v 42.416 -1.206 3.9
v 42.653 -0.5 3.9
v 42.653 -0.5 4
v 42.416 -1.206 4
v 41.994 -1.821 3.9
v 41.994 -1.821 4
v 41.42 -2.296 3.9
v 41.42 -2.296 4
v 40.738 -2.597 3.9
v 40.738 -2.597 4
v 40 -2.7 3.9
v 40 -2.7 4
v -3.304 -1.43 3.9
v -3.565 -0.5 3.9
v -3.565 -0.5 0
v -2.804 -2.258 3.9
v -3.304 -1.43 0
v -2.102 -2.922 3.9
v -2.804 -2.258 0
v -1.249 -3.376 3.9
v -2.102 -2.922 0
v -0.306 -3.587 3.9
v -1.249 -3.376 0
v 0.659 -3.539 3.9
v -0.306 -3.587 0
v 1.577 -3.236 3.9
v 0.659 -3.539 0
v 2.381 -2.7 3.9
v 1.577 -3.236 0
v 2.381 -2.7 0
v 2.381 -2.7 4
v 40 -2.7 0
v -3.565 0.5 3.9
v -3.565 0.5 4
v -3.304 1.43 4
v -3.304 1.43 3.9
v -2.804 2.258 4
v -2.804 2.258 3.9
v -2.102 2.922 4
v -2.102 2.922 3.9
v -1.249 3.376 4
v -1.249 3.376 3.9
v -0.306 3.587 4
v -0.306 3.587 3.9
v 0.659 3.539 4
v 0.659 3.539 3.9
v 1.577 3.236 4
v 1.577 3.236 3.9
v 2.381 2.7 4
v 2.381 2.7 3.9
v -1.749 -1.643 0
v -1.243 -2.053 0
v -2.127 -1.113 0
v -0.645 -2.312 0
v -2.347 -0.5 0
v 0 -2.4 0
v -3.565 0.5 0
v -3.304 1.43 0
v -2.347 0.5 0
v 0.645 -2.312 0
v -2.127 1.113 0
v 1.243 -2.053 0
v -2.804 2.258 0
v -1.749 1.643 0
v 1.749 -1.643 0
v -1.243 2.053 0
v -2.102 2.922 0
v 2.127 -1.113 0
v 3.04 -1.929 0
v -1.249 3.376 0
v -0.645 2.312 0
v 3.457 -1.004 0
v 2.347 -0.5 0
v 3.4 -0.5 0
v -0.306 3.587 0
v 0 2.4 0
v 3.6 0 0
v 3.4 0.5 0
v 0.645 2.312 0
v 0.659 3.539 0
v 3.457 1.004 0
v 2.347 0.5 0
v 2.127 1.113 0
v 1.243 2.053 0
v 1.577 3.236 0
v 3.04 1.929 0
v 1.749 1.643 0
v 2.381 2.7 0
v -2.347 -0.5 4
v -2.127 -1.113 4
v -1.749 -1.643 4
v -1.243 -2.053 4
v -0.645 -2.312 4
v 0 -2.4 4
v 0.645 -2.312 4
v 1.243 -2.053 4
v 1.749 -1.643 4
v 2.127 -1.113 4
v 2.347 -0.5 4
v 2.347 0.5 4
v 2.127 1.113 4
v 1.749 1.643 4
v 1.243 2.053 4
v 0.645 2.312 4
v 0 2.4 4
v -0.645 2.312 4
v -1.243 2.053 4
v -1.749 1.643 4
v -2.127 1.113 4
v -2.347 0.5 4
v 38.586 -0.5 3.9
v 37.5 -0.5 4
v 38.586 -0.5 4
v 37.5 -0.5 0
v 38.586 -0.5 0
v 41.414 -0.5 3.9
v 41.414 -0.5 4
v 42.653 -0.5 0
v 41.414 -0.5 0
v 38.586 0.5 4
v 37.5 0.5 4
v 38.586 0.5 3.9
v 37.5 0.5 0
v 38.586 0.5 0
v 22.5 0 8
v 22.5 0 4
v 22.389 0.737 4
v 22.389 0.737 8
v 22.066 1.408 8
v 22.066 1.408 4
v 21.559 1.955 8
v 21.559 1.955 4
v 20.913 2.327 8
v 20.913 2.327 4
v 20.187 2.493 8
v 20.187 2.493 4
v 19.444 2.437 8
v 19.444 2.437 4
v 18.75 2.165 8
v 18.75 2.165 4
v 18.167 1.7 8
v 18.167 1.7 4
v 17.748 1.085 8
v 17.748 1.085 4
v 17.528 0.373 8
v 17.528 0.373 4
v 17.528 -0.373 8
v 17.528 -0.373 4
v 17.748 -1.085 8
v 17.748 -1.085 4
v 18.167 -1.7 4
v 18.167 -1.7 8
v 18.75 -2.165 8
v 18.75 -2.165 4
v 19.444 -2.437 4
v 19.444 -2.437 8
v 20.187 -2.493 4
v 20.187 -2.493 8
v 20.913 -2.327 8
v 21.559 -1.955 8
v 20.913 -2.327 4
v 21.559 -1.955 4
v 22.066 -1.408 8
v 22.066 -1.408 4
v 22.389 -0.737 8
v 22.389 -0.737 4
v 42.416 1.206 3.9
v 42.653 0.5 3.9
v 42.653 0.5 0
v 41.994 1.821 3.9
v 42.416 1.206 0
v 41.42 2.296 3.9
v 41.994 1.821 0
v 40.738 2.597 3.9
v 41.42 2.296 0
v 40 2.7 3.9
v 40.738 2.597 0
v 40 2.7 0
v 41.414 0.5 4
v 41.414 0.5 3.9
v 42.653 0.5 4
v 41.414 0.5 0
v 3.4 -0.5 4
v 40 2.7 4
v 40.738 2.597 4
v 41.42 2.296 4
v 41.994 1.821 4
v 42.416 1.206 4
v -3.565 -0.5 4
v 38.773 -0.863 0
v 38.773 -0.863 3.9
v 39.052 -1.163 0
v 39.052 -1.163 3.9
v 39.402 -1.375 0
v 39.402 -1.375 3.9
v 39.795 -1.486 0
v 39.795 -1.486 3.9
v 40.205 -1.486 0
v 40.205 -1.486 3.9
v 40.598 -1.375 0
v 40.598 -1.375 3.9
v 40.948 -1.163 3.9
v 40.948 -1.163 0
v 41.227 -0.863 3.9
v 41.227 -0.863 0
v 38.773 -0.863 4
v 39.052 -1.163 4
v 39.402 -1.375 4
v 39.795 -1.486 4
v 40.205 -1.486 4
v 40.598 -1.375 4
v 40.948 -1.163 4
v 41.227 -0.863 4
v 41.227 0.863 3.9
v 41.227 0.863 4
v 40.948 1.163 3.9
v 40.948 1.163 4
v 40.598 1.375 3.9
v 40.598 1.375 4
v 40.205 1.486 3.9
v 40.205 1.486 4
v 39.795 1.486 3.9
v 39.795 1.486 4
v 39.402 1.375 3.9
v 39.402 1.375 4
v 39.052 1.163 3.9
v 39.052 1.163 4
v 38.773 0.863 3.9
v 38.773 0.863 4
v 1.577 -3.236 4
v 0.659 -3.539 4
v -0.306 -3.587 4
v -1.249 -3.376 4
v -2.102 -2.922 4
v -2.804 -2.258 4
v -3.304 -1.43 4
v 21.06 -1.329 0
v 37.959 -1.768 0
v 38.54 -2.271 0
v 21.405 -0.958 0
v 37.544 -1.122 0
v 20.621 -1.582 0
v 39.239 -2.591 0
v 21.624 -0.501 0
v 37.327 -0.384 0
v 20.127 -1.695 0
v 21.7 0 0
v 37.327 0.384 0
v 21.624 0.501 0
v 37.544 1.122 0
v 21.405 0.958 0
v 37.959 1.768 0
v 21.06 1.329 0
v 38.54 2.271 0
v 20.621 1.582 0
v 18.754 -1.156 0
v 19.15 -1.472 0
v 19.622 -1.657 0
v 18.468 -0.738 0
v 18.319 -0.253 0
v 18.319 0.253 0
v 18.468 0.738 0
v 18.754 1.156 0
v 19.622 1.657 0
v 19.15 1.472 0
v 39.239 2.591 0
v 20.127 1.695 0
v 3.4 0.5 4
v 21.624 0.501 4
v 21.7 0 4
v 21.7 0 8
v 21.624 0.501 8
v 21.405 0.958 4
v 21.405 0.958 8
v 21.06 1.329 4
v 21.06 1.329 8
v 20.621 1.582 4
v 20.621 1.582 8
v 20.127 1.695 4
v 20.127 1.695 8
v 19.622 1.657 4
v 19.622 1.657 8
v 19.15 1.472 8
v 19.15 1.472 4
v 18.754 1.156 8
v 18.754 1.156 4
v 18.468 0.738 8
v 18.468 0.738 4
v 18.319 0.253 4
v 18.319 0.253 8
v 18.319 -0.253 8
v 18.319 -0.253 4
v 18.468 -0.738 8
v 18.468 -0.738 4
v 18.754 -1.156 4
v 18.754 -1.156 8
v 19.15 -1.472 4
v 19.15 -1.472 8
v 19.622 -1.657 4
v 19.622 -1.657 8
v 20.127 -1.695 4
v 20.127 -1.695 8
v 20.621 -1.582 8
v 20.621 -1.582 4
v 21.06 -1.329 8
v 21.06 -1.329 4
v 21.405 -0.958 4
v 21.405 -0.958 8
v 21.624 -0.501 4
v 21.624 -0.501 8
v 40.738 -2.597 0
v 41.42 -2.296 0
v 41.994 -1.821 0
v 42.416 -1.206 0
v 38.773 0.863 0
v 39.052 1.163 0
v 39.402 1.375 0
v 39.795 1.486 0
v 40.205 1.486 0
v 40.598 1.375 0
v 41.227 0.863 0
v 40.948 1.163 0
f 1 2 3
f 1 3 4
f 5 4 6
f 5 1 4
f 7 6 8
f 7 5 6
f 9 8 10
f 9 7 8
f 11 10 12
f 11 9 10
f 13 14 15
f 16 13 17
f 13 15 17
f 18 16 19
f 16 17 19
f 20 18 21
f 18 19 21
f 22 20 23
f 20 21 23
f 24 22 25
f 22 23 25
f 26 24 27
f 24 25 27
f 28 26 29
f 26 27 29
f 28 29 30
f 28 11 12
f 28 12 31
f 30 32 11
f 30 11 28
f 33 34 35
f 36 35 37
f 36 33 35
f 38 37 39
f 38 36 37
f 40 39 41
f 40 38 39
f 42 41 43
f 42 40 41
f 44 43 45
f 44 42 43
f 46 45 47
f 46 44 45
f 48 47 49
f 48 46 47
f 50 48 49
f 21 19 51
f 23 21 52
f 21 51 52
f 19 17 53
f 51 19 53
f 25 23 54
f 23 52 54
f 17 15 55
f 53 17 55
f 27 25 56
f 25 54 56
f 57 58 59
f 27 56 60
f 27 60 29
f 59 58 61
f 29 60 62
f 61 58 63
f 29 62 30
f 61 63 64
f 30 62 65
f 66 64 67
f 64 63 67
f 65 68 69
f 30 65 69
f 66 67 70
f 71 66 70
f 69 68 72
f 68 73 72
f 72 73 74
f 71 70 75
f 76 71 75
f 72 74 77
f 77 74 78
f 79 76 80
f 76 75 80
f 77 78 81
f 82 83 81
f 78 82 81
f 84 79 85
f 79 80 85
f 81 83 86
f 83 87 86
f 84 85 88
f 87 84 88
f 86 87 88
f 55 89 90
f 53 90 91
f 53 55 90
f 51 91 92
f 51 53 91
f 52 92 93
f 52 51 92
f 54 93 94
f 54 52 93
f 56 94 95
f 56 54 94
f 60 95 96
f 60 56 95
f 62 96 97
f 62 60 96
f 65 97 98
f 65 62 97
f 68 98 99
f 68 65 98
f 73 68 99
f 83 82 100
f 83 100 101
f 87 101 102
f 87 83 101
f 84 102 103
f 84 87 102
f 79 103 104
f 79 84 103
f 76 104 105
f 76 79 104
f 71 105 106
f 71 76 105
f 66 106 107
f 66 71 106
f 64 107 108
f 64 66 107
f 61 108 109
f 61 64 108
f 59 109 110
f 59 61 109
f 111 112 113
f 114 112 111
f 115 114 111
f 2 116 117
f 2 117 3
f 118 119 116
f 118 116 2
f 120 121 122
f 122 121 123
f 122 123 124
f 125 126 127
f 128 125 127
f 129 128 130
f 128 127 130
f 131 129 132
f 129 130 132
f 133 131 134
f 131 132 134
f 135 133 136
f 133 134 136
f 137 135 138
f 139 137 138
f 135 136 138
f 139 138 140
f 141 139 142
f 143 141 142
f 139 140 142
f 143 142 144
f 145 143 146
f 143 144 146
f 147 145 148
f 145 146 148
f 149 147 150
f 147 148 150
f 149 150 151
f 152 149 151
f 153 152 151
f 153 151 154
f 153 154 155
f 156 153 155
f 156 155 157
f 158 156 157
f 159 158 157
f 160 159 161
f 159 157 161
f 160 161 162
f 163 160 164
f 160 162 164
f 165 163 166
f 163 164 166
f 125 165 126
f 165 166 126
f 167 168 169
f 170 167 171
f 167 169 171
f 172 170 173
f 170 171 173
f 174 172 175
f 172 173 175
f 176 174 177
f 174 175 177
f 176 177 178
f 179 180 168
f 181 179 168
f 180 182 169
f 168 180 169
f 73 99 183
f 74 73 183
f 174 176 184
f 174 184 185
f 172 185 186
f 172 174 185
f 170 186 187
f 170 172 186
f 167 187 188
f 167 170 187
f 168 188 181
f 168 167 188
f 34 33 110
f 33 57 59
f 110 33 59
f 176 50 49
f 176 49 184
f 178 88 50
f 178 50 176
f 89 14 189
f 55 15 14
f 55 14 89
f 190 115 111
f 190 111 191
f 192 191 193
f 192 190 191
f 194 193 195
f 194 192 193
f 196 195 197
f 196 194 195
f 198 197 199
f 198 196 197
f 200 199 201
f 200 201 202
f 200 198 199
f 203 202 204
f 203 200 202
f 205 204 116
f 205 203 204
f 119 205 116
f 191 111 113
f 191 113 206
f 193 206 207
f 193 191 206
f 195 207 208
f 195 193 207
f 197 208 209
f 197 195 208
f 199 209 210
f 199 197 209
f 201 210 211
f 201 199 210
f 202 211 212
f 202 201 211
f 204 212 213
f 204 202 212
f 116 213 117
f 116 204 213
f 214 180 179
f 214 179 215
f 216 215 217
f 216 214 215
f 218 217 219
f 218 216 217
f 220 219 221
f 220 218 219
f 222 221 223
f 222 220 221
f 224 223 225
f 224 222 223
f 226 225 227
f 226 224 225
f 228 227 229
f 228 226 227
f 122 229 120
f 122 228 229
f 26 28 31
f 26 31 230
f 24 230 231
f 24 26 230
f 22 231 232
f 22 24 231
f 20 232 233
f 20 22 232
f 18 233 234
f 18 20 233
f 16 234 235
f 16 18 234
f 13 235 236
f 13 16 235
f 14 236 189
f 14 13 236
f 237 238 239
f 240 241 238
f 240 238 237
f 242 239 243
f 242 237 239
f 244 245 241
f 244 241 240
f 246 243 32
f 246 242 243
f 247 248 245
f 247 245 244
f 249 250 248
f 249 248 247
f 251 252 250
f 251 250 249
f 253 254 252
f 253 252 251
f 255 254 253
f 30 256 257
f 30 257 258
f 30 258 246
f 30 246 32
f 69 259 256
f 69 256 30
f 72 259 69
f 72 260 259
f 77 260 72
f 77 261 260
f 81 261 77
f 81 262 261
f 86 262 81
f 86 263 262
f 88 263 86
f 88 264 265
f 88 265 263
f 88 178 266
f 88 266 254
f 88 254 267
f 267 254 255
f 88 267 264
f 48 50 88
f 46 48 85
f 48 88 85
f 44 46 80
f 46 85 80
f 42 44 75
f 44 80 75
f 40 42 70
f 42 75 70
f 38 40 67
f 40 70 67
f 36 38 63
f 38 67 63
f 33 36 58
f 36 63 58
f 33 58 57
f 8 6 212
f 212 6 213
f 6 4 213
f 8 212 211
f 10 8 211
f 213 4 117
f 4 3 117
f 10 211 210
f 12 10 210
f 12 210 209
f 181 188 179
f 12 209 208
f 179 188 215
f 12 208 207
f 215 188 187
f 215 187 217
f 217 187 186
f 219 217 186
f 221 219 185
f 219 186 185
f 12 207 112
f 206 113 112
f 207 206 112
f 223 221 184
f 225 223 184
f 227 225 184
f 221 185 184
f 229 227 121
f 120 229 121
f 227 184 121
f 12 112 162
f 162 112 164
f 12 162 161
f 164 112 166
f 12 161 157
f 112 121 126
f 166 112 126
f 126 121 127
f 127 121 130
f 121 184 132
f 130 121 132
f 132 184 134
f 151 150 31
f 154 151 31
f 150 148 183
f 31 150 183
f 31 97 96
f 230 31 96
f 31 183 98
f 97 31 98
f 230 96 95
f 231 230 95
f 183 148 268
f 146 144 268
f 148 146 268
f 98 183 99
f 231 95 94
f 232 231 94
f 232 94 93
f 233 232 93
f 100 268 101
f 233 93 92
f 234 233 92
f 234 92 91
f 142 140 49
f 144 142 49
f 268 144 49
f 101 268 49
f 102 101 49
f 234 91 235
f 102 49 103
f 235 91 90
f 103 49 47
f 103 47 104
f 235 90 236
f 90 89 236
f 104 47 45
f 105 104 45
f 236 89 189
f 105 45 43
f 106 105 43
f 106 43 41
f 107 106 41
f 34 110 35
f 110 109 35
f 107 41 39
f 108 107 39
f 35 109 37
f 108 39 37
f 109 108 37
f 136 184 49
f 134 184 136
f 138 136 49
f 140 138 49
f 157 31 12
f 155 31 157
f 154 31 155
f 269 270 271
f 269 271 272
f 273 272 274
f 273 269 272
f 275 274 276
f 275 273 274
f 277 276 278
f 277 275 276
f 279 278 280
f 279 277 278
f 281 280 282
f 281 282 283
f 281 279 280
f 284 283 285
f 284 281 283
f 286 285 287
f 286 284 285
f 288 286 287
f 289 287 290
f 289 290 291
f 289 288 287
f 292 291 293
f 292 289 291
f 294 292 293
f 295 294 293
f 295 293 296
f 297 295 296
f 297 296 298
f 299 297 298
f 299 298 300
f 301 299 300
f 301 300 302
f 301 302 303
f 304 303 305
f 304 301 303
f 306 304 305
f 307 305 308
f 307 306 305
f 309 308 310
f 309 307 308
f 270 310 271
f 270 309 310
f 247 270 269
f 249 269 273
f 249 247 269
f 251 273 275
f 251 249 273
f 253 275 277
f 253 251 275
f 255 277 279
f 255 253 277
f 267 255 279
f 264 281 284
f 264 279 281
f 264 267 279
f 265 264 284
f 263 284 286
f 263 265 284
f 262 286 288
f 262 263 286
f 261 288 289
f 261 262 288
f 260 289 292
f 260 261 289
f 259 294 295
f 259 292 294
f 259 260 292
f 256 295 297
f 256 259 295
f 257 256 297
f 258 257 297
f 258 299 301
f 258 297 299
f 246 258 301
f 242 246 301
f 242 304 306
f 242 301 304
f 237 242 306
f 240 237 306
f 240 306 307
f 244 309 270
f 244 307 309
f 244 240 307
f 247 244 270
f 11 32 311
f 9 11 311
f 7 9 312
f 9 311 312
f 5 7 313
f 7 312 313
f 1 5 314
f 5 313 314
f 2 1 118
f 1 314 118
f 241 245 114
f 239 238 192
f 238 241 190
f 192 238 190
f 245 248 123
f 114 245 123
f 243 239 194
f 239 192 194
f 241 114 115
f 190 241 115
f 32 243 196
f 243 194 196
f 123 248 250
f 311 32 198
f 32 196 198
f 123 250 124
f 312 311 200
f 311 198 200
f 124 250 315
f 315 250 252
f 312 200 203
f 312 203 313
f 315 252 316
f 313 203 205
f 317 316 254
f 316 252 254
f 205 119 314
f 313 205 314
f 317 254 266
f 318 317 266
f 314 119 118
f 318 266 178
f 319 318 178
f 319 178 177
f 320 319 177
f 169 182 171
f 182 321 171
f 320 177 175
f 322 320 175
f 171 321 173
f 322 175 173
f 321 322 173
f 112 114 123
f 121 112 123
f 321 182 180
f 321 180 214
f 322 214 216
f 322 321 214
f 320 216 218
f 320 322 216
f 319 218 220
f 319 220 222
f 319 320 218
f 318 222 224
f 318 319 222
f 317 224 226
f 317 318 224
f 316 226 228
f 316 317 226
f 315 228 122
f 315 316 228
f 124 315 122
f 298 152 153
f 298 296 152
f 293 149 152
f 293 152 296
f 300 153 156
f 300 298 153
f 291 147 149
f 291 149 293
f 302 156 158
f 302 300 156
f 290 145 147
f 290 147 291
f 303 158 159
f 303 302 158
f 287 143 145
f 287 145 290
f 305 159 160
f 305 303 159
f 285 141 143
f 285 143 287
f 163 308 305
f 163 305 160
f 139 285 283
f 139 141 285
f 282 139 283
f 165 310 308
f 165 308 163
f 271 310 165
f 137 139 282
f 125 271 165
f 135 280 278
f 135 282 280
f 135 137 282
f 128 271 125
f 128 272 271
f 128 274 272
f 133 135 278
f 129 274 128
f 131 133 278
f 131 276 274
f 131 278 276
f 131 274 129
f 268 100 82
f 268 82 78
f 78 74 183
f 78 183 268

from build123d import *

# Parameters (mm, degrees)
ESQUISSE1_R                = 3.6
ESQUISSE1_R_2              = 2.4
CC_AXE_SERVO_DEPTH         = 3.9
ESQUISSE3_R                = 2.7
ESQUISSE3_R_2              = 1.5
CC_PIVOT_JAMBE_DEPTH       = 3.9
ESQUISSE4_R                = 2.4
ESQUISSE4_R_2              = 1.5
LIAISON_DEPTH              = 4
ESQUISSE9_W                = 7
ESQUISSE9_H                = 1
ELASTICITE_AXE_SERVO_DEPTH = 5
ESQUISSE7_R                = 1.7
PASSAGE_VIS_DEPTH          = 5
ESQUISSE8_R                = 2.5
ESQUISSE8_R_2              = 1.7
BUTEE_ASSEMBLAGE_DEPTH     = 4
ESQUISSE10_W               = 5.2
ESQUISSE10_H               = 1
ELASTICITE_DEPTH           = 9


with BuildPart() as part:
    # Esquisse1 → CC_AXE_SERVO (new body)
    with BuildSketch(Plane.XY):
        Circle(ESQUISSE1_R)
        Circle(ESQUISSE1_R_2, mode=Mode.SUBTRACT)
    extrude(amount=CC_AXE_SERVO_DEPTH)



with BuildPart() as body_2:
    # Esquisse3 → CC_PIVOT_JAMBE (new body)
    with BuildSketch(Plane.XY):
        with Locations((40, 0)):
            Circle(ESQUISSE3_R)
        with Locations((40, 0)):
            Circle(ESQUISSE3_R_2, mode=Mode.SUBTRACT)
    extrude(amount=CC_PIVOT_JAMBE_DEPTH)


with BuildPart() as part_1:
    add(part.part)

    add(body_2.part)  # LIAISON merges body 2
    # Esquisse4 → LIAISON (add)
    with BuildSketch(Plane.XY):
        with BuildLine():
            Line((2.38117618, 2.7), (40, 2.7))
            ThreePointArc((40, 2.7), (42.7, 0), (40, -2.7))
            Line((40, -2.7), (2.38117618, -2.7))
            ThreePointArc((2.38117618, -2.7), (-3.6, 0), (2.38117618, 2.7))
        make_face()
        Circle(ESQUISSE4_R, mode=Mode.SUBTRACT)
        with Locations((40, 0)):
            Circle(ESQUISSE4_R_2, mode=Mode.SUBTRACT)
    extrude(amount=LIAISON_DEPTH)

    # Esquisse9 → ELASTICITE_AXE_SERVO (cut, through all)
    with BuildSketch(Plane.XY):
        with Locations((-0.1, 0)):
            Rectangle(ESQUISSE9_W, ESQUISSE9_H)
    extrude(amount=ELASTICITE_AXE_SERVO_DEPTH, mode=Mode.SUBTRACT)

    # Esquisse7 → PASSAGE_VIS (cut, through all)
    with BuildSketch(Plane.XY):
        with Locations((20, 0)):
            Circle(ESQUISSE7_R)
    extrude(amount=PASSAGE_VIS_DEPTH, mode=Mode.SUBTRACT)

    # Esquisse8 → BUTEE_ASSEMBLAGE (add)
    with BuildSketch(Plane.XY.offset(4)):
        with Locations((20, 0)):
            Circle(ESQUISSE8_R)
        with Locations((20, 0)):
            Circle(ESQUISSE8_R_2, mode=Mode.SUBTRACT)
    extrude(amount=BUTEE_ASSEMBLAGE_DEPTH)

    # Esquisse10 → ELASTICITE (cut, through all)
    with BuildSketch(Plane.XY):
        with Locations((40.1, 0)):
            Rectangle(ESQUISSE10_W, ESQUISSE10_H)
    extrude(amount=ELASTICITE_DEPTH, mode=Mode.SUBTRACT)


solid = part_1.part
